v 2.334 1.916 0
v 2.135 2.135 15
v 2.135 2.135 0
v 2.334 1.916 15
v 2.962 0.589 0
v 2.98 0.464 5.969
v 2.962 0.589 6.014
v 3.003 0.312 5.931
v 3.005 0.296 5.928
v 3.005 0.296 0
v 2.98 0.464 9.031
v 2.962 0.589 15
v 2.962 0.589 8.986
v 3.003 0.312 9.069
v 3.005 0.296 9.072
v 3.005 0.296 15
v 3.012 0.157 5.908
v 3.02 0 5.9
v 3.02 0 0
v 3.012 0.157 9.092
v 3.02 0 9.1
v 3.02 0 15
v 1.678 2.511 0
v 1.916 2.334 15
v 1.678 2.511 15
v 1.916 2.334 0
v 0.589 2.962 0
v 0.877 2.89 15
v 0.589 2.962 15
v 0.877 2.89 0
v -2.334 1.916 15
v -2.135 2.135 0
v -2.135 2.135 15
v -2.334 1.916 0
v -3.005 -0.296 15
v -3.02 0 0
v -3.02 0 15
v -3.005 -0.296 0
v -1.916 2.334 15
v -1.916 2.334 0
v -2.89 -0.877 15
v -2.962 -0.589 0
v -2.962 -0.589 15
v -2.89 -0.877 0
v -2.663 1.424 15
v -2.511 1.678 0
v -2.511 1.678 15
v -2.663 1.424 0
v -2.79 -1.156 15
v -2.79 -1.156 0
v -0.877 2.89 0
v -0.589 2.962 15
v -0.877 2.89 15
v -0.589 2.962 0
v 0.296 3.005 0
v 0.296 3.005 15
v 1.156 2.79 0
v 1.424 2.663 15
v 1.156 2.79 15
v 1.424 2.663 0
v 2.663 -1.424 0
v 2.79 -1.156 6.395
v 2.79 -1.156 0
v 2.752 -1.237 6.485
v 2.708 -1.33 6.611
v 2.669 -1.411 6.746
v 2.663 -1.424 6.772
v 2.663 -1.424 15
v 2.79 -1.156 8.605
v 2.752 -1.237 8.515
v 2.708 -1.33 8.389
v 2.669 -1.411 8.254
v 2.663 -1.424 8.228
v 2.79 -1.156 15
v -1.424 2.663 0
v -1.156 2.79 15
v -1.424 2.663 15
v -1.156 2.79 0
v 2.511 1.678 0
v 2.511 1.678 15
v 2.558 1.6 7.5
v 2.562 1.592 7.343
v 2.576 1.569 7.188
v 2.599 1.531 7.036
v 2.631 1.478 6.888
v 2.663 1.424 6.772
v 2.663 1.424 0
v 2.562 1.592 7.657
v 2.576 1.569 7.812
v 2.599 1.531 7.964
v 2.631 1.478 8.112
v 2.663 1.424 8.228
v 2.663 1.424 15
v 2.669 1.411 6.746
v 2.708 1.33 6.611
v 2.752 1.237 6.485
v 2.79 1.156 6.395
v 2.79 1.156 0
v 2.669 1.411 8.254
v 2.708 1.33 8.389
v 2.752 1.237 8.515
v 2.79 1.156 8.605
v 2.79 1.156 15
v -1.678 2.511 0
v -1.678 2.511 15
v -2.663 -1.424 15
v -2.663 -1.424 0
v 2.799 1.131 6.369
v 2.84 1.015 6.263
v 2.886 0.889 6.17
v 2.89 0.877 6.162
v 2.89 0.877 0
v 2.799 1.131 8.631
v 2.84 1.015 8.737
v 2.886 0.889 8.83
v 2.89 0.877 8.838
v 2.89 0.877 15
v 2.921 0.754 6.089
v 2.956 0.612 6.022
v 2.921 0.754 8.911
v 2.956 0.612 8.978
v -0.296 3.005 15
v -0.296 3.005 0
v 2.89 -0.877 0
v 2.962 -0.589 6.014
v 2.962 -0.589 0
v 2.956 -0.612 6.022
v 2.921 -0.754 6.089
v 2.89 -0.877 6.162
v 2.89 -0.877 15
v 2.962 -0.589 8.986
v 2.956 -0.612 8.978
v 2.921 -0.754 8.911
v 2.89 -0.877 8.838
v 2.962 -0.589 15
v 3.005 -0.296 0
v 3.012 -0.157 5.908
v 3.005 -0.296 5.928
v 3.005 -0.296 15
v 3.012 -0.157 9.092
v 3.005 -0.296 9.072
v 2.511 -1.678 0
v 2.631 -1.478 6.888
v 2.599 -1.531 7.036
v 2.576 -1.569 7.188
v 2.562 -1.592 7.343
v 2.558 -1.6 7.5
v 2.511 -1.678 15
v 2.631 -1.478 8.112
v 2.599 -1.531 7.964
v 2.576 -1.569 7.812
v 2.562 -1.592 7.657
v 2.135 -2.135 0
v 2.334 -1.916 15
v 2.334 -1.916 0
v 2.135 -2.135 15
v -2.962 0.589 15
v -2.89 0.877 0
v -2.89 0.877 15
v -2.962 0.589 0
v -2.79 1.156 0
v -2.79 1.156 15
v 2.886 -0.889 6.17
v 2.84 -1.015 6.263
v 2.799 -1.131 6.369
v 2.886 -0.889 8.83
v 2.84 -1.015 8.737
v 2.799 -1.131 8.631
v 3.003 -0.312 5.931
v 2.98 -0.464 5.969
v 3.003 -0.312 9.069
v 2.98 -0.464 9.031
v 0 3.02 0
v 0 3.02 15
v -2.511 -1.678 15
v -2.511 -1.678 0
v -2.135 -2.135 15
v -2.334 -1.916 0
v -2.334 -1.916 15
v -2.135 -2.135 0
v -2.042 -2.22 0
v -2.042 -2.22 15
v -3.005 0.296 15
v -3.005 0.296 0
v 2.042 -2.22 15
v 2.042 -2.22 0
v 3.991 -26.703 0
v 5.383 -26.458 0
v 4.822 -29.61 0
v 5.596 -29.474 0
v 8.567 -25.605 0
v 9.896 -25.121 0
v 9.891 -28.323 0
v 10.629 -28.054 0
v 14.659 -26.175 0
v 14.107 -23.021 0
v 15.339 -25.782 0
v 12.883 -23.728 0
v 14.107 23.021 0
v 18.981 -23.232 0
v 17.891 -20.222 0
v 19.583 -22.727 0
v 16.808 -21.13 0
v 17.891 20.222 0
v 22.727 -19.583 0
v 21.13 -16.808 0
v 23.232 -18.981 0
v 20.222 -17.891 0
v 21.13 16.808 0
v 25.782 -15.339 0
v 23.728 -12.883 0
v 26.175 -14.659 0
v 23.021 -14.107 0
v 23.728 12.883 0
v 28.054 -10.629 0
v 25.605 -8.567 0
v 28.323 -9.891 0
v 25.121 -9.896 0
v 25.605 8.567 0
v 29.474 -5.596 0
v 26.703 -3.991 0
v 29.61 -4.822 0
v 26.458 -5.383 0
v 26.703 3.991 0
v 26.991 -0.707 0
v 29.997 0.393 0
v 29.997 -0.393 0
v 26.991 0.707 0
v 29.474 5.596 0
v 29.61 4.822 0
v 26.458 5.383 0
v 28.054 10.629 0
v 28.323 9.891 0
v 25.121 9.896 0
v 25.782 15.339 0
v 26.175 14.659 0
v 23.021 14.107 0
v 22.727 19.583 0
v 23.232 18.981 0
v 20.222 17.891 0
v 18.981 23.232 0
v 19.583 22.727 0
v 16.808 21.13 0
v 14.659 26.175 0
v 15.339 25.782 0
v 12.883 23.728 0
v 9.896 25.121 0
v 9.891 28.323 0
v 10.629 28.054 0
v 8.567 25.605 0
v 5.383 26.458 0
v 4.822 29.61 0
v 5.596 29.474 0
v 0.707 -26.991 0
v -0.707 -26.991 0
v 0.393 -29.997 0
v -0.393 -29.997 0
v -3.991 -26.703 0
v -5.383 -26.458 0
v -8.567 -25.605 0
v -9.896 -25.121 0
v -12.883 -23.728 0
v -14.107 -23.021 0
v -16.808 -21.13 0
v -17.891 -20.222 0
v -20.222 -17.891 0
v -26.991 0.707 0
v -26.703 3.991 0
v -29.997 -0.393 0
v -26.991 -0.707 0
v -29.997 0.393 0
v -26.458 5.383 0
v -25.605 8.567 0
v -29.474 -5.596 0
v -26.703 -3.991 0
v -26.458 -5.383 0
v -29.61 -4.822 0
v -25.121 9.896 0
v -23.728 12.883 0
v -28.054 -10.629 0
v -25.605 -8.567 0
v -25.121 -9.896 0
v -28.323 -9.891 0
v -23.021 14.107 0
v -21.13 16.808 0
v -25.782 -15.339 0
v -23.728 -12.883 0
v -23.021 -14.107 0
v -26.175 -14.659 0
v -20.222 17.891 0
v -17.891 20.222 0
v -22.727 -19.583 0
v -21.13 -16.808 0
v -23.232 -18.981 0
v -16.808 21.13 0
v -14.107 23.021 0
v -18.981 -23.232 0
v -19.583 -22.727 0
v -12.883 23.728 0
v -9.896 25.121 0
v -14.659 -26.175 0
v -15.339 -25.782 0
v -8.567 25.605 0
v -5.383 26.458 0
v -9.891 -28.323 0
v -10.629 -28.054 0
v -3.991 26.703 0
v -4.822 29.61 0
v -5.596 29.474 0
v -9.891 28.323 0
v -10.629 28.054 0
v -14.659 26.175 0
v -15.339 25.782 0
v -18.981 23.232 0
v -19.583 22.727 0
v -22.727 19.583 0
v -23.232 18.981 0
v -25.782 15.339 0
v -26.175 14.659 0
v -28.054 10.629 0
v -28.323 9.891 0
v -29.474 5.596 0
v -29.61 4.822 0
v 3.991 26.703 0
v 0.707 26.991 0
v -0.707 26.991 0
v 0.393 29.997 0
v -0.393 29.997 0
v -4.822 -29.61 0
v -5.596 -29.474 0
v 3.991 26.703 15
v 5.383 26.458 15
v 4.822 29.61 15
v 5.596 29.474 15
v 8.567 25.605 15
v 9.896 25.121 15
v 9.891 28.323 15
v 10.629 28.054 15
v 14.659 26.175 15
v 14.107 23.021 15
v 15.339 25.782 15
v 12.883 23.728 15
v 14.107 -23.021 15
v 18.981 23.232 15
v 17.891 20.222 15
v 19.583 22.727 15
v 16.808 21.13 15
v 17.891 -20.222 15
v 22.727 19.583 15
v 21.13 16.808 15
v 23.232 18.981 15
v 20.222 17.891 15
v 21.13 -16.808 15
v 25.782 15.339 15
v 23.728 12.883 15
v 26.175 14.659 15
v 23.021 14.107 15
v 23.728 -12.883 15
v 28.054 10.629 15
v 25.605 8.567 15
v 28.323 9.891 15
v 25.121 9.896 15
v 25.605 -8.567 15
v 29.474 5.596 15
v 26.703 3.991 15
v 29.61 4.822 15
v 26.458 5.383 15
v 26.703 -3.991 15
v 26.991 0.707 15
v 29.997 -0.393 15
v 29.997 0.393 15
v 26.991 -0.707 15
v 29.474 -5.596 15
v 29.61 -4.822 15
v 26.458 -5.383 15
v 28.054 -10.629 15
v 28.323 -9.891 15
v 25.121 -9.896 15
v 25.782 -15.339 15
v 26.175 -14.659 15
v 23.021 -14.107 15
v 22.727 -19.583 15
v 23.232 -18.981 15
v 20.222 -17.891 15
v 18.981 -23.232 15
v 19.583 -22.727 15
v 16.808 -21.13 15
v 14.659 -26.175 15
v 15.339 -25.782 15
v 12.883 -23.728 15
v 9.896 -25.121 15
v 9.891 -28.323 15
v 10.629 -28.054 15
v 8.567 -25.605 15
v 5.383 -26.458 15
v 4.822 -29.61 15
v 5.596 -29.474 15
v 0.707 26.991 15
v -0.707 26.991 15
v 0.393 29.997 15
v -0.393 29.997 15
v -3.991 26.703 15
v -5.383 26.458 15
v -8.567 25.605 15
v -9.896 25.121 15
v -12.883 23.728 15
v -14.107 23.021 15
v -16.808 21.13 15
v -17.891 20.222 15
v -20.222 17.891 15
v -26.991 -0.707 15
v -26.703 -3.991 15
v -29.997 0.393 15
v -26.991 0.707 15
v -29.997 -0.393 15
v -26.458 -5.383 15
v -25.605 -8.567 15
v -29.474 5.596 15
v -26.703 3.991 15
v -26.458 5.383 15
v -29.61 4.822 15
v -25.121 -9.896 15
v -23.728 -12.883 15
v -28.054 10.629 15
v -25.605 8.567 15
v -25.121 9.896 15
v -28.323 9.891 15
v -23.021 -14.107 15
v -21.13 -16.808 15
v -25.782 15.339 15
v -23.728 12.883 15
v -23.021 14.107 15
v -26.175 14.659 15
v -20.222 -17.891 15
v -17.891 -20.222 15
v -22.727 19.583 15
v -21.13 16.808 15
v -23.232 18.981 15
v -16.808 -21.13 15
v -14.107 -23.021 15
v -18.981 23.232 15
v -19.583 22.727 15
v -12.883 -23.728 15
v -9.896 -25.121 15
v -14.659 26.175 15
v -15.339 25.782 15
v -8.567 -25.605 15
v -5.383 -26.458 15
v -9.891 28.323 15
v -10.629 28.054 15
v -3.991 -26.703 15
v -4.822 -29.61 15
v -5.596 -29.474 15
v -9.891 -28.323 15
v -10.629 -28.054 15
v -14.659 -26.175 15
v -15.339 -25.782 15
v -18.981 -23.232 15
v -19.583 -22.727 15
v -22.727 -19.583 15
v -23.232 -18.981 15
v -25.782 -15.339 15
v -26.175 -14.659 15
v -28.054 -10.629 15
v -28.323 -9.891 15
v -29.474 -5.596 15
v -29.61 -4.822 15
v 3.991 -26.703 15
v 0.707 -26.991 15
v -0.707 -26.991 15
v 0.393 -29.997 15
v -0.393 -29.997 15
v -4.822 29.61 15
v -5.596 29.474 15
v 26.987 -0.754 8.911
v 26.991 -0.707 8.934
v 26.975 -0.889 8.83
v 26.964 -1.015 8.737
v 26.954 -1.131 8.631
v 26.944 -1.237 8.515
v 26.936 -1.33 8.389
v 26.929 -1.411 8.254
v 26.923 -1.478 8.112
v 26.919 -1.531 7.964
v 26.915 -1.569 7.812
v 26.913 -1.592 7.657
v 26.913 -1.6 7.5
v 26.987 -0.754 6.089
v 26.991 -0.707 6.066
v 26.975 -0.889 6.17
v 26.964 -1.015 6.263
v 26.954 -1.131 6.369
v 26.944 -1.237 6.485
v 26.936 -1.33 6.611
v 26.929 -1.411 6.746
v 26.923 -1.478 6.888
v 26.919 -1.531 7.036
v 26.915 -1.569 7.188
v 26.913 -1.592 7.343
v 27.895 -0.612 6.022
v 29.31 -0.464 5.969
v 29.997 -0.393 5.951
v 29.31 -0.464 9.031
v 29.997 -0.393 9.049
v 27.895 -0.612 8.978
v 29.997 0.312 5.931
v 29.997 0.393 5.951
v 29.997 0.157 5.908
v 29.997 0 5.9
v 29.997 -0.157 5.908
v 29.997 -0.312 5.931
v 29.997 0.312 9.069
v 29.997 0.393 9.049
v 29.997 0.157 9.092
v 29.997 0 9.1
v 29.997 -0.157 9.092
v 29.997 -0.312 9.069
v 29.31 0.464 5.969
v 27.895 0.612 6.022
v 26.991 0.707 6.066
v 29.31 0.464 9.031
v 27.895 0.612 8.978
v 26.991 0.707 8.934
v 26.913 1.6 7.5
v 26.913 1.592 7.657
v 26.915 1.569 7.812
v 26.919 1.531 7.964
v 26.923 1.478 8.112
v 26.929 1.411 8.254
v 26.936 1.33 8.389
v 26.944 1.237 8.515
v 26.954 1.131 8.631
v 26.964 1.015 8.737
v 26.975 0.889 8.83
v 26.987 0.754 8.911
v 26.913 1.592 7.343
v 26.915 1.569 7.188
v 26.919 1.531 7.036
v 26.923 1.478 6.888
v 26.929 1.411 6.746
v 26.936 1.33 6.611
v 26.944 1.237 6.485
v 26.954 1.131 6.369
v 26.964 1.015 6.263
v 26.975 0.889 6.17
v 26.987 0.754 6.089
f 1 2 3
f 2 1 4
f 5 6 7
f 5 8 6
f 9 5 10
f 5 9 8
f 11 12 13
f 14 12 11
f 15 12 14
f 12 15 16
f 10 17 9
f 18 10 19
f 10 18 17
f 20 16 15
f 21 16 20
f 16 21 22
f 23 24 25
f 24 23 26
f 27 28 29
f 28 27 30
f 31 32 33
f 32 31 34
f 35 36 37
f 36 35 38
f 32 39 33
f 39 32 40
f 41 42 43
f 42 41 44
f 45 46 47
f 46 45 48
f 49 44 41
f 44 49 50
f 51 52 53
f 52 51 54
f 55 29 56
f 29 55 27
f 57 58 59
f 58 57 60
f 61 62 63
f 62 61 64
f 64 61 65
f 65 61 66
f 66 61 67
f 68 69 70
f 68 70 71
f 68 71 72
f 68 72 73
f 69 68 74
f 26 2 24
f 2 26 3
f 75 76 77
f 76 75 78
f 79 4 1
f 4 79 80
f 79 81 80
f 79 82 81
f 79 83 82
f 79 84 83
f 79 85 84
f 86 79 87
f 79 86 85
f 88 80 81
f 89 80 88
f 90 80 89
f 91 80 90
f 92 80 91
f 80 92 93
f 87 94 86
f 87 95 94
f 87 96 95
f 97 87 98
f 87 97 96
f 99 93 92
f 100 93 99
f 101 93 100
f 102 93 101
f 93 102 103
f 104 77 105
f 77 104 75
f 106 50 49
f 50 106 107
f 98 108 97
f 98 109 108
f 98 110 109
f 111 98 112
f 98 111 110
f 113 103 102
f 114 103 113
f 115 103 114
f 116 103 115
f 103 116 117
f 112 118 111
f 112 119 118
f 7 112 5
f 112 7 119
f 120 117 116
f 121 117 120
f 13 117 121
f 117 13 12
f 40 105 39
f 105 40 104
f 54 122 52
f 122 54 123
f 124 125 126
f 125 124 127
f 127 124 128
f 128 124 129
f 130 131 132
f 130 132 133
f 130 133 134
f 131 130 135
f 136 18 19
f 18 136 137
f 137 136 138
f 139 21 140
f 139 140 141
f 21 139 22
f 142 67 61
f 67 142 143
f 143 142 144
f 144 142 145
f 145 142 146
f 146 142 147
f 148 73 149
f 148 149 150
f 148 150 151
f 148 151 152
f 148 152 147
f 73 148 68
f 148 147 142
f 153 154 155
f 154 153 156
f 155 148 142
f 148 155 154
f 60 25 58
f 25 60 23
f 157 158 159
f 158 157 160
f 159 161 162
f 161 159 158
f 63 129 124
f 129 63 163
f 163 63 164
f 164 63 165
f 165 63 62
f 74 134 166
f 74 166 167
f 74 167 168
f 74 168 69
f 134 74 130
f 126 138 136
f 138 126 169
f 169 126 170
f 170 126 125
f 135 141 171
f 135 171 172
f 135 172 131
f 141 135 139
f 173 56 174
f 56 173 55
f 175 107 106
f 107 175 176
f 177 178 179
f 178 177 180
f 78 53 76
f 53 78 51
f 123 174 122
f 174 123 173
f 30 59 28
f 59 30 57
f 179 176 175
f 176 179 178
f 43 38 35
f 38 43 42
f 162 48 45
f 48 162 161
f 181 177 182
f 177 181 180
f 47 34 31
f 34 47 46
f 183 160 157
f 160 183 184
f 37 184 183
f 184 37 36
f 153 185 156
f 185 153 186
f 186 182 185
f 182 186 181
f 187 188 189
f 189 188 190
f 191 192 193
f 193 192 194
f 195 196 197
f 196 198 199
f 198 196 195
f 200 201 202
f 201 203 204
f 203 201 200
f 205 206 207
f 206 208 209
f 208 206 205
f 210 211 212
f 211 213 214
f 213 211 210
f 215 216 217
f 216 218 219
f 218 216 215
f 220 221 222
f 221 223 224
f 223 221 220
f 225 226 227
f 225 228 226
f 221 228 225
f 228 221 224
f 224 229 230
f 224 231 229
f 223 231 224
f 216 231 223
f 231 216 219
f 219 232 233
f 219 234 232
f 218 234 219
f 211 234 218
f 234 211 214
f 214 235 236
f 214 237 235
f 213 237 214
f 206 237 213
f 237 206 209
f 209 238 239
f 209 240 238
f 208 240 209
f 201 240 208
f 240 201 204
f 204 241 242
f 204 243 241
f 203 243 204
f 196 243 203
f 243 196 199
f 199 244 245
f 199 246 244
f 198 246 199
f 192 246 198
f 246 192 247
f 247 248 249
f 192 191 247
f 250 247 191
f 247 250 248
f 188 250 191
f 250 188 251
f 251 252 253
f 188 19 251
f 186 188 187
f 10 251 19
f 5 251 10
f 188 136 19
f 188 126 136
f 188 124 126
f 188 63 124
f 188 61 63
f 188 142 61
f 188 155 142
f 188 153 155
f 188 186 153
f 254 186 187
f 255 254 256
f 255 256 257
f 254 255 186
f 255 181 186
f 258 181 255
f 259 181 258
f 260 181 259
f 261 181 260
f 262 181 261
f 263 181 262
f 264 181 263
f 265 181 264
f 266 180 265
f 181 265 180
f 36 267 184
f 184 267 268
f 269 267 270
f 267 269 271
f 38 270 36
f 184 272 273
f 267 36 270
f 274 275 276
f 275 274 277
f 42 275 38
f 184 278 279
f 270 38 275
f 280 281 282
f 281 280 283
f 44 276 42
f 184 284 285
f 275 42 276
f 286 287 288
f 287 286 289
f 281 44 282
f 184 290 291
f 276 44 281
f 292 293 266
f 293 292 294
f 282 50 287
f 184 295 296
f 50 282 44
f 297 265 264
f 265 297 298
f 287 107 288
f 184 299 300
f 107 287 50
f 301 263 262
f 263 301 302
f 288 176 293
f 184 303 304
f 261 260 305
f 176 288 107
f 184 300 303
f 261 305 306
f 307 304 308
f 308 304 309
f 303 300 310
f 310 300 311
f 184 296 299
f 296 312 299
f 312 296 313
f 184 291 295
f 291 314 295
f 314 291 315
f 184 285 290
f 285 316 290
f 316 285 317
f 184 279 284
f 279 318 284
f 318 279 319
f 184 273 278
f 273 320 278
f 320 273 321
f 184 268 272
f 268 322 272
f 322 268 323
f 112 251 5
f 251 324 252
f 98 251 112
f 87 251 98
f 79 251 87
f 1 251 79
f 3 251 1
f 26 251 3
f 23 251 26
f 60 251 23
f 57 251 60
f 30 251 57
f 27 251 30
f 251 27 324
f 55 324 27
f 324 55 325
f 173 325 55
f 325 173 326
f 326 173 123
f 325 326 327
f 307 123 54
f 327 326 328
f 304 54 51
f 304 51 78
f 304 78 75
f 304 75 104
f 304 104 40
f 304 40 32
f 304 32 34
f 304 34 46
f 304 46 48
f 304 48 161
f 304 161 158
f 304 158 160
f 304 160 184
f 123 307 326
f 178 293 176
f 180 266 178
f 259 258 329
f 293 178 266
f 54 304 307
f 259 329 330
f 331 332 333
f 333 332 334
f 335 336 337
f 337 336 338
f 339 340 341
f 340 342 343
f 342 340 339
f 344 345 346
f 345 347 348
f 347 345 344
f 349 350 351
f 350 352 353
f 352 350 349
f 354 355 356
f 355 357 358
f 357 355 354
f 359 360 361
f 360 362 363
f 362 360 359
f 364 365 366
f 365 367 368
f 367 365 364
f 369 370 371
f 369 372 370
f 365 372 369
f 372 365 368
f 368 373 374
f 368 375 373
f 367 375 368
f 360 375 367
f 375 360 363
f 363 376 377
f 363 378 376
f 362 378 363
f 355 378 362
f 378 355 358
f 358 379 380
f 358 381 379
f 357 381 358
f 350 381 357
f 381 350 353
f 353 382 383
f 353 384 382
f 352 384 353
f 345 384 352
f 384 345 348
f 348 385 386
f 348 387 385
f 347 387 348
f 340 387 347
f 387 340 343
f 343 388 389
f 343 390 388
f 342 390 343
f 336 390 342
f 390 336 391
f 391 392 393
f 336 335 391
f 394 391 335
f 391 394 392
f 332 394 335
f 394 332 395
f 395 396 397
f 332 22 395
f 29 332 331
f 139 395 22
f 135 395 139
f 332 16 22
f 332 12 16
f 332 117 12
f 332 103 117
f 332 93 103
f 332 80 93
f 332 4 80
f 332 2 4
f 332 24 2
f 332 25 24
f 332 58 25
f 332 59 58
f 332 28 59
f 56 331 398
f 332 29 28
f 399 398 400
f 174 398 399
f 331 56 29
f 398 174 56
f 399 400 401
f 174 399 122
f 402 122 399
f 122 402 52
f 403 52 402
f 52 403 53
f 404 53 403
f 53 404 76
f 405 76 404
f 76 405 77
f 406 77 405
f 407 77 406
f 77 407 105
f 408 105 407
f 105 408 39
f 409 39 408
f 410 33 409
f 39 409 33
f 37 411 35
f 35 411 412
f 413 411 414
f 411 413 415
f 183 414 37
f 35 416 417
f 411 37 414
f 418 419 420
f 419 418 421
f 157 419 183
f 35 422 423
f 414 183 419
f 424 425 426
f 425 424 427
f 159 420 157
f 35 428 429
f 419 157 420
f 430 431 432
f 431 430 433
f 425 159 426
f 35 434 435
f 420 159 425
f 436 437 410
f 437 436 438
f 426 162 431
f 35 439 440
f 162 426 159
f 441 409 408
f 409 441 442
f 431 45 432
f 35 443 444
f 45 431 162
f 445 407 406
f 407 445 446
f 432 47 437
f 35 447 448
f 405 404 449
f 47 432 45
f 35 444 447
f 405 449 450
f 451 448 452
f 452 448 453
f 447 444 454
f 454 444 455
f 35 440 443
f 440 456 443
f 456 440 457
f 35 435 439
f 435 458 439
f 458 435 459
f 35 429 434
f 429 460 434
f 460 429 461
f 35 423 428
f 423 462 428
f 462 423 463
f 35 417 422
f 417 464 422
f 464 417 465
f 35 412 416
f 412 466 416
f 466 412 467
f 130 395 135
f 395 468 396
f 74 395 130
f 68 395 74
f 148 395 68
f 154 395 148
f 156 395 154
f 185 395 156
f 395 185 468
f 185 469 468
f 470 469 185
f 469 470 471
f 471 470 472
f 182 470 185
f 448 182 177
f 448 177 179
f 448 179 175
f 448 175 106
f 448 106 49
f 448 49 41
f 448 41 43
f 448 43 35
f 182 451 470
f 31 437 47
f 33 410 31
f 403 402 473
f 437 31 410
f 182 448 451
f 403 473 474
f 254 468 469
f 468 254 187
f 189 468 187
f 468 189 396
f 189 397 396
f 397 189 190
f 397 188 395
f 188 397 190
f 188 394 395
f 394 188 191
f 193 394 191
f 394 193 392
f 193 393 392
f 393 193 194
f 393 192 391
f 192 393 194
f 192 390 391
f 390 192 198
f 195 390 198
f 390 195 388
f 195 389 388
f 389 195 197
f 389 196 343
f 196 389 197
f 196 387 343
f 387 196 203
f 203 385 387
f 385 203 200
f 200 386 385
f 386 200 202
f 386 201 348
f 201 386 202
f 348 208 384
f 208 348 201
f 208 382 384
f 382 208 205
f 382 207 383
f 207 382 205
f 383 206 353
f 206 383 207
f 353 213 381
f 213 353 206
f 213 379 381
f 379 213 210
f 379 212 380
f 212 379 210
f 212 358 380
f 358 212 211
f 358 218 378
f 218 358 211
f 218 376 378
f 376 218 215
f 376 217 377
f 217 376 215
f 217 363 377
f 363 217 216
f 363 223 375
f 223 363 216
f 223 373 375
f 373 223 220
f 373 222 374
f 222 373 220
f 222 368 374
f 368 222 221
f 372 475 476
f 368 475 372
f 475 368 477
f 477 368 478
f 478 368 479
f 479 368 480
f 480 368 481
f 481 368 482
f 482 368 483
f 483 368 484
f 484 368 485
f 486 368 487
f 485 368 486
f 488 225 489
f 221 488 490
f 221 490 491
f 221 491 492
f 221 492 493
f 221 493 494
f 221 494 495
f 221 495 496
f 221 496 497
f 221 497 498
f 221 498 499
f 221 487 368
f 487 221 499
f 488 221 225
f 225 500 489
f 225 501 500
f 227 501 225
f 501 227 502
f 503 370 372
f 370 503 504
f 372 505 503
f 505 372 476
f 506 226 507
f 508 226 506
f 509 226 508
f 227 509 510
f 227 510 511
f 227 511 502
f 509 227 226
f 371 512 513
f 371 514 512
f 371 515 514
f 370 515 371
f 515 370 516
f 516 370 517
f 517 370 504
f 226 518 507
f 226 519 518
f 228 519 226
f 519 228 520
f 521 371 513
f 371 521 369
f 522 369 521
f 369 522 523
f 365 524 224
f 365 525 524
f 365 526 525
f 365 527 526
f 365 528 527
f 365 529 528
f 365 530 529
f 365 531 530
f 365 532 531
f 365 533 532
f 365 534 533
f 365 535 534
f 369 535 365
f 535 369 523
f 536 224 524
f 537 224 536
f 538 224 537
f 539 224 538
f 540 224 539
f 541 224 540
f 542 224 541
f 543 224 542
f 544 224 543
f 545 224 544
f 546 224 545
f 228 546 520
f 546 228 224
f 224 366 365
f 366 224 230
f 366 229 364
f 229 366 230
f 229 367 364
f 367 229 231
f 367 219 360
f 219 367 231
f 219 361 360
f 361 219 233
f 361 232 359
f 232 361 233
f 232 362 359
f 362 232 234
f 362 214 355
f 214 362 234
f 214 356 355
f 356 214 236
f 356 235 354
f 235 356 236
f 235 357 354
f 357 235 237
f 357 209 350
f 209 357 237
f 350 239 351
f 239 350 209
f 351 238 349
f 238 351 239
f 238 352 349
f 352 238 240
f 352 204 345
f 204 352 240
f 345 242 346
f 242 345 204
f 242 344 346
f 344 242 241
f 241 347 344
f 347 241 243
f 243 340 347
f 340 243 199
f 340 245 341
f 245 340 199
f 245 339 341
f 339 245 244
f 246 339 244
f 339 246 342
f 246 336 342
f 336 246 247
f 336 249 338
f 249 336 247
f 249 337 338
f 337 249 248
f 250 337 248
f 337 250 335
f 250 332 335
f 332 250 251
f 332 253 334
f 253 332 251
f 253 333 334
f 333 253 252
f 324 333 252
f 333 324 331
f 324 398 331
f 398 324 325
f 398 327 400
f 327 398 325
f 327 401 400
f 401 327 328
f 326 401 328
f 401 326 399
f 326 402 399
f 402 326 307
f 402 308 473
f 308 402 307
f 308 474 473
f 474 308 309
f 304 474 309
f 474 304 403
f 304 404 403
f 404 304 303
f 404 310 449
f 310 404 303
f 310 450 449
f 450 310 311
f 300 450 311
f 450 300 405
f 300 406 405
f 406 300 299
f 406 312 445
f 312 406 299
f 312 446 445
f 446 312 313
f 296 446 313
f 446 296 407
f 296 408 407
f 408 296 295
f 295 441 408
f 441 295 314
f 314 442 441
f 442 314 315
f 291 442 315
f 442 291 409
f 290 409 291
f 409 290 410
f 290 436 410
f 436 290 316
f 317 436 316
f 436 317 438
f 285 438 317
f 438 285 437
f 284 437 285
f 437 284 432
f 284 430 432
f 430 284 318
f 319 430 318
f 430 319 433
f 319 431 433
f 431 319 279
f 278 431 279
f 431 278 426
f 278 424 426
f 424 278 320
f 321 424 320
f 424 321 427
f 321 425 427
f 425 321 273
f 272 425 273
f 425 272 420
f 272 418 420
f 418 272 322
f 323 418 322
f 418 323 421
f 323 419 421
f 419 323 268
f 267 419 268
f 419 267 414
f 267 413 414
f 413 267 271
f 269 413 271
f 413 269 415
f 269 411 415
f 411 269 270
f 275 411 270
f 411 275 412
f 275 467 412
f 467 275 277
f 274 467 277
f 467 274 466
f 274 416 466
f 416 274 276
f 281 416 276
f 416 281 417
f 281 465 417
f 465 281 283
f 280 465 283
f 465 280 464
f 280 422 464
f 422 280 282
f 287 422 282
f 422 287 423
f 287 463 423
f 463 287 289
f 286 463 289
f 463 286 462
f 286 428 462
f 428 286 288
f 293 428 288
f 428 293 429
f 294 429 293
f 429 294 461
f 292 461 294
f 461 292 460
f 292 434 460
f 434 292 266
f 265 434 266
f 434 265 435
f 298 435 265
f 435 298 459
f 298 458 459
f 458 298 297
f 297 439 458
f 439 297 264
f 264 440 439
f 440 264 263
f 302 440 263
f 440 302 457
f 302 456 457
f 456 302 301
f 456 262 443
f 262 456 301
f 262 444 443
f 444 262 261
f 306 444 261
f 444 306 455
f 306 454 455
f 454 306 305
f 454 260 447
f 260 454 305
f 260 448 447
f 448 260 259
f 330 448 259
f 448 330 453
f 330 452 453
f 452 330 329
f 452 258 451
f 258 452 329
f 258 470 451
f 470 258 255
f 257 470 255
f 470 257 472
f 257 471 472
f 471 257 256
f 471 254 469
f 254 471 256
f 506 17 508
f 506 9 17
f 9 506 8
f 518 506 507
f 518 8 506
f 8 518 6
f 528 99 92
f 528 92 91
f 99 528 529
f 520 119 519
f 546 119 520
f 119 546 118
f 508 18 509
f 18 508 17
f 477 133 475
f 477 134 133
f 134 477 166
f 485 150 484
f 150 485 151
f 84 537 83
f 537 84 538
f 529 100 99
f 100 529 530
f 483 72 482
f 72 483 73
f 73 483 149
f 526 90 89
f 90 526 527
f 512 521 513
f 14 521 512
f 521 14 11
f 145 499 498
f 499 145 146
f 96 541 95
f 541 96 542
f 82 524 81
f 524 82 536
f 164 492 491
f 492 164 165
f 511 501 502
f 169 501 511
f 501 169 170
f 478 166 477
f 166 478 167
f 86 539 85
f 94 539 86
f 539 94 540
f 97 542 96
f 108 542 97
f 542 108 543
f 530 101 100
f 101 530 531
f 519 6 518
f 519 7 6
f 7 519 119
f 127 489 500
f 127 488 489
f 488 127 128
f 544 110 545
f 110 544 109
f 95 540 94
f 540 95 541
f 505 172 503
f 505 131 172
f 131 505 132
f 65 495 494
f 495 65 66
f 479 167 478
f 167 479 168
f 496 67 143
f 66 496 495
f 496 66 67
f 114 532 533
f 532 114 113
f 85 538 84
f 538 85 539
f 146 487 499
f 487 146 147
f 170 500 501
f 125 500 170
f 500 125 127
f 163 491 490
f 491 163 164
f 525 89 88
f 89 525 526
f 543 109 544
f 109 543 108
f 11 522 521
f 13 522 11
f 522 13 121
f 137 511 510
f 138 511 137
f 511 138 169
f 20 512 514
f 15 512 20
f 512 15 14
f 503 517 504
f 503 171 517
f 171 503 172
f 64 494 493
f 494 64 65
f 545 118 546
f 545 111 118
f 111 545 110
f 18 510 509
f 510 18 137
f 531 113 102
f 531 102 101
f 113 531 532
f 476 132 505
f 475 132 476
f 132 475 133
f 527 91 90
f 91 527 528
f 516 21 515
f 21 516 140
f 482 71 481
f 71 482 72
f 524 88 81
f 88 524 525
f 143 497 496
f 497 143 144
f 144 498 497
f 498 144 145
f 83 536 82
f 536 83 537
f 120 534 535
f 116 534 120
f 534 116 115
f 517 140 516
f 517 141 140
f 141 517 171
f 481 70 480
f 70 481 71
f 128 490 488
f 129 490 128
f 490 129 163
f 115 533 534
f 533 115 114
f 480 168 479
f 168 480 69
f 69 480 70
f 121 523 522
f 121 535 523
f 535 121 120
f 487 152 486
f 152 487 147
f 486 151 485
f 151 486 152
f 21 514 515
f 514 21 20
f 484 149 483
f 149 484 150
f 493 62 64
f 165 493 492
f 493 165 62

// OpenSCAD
// FILE: 04_Drive_Gears_Independent.scad

$fn = 64;
mode = "encoder"; // CHANGE TO "encoder" TO RENDER THE OTHER ONE

if (mode == "motor") drive_gear(dia = 5.03, is_d = false);
if (mode == "encoder") drive_gear(dia = 6.04, is_d = true);

module drive_gear(dia, is_d) {
    difference() {
        linear_extrude(height = 15) gear_profile(36, 30, 27);
        translate([0,0,-1]) {
            if(is_d) intersection() {
                cylinder(h=17, d=dia);
                translate([-dia/2, -dia/2 + 0.8, 0]) cube([dia, dia, 17]);
            } else cylinder(h=17, d=dia);
        }
        translate([0, 0, 7.5]) rotate([0, 90, 0]) cylinder(h=30, d=3.2);
    }
}

module gear_profile(teeth, r_out, r_in, flat=0.6) {
    angle_step = 360/teeth;
    points = [for (i = [0:teeth-1]) each [
        [r_in*cos(i*angle_step-angle_step*flat/4), r_in*sin(i*angle_step-angle_step*flat/4)],
        [r_out*cos(i*angle_step-angle_step*flat/8), r_out*sin(i*angle_step-angle_step*flat/8)],
        [r_out*cos(i*angle_step+angle_step*flat/8), r_out*sin(i*angle_step+angle_step*flat/8)],
        [r_in*cos(i*angle_step+angle_step*flat/4), r_in*sin(i*angle_step+angle_step*flat/4)]
    ]];
    polygon(points);
}
